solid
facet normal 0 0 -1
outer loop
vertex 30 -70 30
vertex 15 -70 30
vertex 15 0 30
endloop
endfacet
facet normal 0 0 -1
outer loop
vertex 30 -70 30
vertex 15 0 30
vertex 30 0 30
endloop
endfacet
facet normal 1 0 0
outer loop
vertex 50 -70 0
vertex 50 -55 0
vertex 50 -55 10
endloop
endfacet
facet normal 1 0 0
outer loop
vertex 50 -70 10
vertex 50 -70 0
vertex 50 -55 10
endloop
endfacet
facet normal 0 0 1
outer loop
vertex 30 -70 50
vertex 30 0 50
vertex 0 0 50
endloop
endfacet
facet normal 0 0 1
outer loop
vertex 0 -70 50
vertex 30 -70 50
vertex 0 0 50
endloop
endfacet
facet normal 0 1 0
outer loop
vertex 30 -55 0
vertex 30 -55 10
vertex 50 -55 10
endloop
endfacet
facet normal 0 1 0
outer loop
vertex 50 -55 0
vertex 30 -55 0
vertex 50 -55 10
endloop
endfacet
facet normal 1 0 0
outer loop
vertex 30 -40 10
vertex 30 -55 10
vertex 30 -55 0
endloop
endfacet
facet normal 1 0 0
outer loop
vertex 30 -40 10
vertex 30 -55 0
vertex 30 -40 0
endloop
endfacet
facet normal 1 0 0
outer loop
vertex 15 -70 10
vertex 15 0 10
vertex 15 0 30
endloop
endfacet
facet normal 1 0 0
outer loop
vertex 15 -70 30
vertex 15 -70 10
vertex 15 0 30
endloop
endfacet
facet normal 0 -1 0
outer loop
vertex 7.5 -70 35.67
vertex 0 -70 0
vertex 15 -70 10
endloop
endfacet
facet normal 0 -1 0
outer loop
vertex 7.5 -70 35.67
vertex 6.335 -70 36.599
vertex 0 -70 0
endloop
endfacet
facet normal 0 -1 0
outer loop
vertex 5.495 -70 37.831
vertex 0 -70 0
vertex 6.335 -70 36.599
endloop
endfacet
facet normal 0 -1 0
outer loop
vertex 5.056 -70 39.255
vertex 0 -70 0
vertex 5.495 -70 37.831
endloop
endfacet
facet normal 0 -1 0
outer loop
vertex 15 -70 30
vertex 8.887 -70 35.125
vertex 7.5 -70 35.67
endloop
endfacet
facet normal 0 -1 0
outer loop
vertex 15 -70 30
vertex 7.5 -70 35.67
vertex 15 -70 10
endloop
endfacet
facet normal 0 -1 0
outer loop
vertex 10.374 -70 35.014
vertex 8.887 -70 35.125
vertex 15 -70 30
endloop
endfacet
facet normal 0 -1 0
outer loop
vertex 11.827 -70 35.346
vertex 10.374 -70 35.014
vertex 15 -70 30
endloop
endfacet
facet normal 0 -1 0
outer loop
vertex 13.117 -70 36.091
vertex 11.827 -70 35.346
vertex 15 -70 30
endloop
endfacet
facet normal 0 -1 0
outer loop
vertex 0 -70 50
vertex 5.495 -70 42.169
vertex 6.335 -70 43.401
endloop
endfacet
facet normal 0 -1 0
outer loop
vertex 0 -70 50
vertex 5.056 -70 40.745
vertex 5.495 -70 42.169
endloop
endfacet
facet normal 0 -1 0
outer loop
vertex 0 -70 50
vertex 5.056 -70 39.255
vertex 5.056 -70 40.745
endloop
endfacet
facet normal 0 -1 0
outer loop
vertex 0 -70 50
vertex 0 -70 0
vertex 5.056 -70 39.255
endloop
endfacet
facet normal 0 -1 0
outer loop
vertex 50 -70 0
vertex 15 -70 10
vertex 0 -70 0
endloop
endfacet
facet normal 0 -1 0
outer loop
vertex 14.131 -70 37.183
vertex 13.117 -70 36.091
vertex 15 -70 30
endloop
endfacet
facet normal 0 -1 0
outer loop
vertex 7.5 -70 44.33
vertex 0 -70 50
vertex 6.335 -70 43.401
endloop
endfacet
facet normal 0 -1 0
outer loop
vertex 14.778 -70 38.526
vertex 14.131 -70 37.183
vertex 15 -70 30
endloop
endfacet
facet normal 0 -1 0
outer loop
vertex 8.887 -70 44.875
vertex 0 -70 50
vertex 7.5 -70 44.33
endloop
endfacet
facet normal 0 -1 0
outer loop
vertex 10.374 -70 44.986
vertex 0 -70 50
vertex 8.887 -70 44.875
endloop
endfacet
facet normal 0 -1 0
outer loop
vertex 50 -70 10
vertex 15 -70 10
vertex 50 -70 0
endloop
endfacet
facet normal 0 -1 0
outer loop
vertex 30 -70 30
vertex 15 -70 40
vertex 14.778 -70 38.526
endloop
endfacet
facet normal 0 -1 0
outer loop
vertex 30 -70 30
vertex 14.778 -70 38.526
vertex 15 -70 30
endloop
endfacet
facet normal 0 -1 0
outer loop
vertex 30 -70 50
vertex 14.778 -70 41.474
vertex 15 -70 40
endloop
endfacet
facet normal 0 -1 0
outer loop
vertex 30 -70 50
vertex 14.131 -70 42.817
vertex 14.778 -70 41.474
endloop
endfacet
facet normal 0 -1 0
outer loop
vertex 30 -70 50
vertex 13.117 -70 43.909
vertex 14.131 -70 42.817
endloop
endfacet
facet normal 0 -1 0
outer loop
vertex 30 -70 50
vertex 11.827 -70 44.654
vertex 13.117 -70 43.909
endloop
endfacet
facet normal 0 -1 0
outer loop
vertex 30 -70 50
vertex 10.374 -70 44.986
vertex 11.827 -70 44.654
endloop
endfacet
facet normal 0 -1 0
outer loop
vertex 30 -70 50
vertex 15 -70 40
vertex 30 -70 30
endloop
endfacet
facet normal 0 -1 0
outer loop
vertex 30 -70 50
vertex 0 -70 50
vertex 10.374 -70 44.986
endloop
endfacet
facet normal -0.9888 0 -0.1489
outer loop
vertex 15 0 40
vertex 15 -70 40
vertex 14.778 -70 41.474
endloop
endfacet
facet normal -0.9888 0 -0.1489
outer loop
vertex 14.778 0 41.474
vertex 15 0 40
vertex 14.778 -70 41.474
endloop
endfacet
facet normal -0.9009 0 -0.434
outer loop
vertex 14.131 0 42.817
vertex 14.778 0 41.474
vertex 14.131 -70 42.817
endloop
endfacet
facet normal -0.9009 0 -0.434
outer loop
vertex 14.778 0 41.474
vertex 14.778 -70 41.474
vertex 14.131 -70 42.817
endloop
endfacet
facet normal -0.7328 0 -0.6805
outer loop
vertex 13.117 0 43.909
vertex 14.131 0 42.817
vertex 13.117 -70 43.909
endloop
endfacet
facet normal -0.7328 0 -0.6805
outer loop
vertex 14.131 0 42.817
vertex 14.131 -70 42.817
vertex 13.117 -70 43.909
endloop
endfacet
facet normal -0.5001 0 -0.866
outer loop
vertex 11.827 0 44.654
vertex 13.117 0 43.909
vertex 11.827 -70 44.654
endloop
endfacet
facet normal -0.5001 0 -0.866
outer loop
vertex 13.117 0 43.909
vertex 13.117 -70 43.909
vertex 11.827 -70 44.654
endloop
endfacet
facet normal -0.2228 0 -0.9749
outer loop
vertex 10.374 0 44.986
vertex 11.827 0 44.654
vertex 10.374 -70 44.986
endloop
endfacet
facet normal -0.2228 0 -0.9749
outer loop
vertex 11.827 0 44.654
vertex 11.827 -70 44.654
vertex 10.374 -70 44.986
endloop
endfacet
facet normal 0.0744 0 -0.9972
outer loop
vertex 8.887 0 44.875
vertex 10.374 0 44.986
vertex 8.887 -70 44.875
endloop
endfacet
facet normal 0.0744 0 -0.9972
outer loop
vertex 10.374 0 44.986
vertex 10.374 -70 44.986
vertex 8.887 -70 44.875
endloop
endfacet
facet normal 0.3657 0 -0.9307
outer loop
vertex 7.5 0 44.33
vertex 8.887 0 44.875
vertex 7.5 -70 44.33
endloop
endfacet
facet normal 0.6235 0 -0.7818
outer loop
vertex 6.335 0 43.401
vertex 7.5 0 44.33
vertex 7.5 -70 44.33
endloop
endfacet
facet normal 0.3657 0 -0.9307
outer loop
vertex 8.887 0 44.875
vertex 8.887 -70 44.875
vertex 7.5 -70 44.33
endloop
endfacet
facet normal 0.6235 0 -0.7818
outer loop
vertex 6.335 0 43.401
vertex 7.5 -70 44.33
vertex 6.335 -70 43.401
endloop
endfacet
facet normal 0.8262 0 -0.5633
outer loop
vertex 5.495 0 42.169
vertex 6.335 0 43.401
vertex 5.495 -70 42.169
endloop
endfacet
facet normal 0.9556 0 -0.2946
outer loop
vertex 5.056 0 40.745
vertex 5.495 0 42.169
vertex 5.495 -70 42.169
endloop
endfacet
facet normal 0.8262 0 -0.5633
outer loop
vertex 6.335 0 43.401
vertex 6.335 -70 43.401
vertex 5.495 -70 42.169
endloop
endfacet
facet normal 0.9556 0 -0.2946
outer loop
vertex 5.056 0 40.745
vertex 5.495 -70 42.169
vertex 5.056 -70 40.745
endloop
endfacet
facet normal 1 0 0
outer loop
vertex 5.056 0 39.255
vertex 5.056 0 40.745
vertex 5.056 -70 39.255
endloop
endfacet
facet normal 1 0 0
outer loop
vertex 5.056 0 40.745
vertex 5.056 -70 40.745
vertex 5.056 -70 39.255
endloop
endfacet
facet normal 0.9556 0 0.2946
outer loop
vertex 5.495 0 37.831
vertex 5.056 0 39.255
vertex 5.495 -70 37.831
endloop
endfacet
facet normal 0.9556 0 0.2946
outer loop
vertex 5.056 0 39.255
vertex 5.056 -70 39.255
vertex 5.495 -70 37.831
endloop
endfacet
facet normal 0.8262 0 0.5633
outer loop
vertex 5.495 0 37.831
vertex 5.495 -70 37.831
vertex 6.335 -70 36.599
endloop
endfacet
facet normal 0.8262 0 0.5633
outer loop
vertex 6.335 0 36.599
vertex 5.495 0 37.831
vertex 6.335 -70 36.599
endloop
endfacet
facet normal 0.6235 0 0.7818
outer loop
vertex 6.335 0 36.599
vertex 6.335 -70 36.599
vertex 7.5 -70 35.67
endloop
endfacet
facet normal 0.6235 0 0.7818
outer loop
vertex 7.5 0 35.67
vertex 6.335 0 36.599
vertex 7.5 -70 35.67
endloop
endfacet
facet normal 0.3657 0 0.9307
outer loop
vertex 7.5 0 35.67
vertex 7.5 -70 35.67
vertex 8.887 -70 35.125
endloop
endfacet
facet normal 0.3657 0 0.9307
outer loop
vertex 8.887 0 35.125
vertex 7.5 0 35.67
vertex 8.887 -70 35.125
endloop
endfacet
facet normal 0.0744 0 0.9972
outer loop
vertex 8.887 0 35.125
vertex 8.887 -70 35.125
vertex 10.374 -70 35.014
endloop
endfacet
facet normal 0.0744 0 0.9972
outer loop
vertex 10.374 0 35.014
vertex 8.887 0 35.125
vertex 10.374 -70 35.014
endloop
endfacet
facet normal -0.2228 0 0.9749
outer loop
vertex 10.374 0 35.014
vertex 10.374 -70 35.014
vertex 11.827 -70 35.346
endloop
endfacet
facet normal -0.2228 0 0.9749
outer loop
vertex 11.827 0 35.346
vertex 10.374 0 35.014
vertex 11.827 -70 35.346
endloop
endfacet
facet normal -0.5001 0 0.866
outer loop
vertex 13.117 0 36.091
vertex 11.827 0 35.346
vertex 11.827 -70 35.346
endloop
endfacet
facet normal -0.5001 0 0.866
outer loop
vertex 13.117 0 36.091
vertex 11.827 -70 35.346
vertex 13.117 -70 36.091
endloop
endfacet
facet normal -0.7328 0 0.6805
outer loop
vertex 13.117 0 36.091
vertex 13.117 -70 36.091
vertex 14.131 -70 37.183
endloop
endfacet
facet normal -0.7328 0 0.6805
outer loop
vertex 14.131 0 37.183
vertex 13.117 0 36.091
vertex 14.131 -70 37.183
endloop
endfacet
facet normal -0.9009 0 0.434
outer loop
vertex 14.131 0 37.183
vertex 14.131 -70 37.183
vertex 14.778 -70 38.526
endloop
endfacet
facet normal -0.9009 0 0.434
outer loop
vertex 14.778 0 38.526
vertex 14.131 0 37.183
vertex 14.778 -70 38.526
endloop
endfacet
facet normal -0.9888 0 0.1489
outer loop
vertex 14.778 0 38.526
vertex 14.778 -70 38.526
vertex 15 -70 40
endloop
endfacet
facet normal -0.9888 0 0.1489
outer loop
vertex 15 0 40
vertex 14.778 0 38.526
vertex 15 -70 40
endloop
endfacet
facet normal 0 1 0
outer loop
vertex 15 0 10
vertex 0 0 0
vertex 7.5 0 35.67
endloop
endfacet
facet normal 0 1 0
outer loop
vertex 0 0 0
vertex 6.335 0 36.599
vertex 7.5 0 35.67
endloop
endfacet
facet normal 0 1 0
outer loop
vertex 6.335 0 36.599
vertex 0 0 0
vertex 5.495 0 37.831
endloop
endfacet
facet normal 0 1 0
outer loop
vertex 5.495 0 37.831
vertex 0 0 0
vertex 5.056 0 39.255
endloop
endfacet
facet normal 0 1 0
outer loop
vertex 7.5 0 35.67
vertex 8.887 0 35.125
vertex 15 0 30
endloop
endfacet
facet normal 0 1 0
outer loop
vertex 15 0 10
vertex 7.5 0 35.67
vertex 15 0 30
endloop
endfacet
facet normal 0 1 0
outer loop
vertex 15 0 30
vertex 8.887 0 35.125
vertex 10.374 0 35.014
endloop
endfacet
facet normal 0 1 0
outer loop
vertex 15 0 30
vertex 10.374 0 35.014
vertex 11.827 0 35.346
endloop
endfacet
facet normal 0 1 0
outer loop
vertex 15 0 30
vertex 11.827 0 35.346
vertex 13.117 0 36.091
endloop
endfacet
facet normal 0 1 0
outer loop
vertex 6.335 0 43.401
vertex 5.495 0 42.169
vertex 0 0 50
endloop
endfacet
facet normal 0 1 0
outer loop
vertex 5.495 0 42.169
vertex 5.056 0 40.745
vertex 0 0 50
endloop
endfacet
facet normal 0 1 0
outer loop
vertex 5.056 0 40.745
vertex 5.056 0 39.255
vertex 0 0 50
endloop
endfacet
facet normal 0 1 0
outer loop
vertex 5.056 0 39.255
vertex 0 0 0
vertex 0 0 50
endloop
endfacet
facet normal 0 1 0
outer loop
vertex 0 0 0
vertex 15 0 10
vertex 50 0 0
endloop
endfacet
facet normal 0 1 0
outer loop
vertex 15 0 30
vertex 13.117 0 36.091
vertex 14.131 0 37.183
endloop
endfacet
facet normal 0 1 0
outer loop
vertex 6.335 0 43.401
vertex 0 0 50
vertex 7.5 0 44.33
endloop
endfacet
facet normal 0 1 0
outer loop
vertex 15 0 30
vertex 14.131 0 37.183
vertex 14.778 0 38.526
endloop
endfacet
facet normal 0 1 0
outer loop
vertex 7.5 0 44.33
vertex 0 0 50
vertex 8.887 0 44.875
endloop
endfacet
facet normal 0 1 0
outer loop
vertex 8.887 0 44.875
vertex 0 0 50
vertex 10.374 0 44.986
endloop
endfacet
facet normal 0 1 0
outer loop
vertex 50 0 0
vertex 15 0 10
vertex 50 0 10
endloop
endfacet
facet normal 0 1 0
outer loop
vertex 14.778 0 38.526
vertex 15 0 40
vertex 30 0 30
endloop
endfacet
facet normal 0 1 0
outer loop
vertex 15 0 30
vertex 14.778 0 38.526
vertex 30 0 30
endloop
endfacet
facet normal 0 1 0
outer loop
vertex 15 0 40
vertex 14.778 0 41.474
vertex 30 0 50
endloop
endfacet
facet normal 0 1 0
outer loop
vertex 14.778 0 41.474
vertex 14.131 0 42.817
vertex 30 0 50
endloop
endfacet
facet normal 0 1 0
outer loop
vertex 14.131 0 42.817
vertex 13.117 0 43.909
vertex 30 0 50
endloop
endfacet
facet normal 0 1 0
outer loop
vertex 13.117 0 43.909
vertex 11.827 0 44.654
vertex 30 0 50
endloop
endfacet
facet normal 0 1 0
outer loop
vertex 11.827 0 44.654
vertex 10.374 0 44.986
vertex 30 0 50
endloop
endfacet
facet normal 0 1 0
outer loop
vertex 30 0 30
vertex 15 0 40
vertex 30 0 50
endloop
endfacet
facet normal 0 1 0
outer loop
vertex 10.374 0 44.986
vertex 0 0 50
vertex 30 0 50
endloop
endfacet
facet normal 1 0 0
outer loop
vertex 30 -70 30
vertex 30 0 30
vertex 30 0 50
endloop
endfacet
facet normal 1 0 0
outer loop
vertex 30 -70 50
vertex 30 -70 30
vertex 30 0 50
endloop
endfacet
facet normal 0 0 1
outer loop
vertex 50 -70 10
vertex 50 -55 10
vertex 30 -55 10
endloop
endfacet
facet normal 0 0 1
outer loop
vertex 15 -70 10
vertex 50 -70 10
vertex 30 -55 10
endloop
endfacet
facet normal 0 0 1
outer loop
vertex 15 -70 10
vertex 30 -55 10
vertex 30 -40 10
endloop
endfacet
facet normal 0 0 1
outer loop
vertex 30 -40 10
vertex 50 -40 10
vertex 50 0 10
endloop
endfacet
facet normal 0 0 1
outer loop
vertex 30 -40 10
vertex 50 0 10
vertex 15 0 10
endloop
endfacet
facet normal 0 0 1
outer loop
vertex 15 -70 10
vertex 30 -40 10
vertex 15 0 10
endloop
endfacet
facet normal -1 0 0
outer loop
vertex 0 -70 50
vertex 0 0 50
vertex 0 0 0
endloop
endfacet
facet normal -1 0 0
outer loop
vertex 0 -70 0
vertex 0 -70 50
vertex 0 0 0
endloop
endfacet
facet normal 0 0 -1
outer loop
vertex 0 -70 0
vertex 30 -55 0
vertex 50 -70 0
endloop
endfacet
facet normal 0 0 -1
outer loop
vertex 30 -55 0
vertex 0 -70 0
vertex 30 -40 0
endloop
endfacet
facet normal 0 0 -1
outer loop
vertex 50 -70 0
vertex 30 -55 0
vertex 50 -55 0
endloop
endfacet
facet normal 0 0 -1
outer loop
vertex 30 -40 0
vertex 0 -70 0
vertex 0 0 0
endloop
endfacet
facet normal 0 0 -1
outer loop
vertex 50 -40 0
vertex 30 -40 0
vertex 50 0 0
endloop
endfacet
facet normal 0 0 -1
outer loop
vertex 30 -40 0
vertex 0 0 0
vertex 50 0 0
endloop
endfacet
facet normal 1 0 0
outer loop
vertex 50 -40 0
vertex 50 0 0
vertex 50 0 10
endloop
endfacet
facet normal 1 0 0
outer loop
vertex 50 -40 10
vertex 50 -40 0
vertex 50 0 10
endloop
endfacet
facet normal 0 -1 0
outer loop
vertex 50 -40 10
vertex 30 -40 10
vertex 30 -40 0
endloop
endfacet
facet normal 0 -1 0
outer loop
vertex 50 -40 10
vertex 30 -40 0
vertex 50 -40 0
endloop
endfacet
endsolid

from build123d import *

# Parameters (mm, degrees)
F1_DEPTH = 70
F2_W     = 20
F2_H     = 15
F3_DEPTH = 25
F4_R     = 5
F5_DEPTH = 70.001


with BuildPart() as f1:
    # F0 (on Front) → F1 (new body)
    with BuildSketch(Plane.XZ):
        Polygon((0, 50), (0, 0), (50, 0), (50, 10), (15, 10), (15, 30), (30, 30), (30, 50), align=None)
    extrude(amount=F1_DEPTH)

    # F2 (on face) → F3 (cut)
    with BuildSketch(Plane.XY.offset(10)):
        with Locations((40, -47.5)):
            Rectangle(F2_W, F2_H)
    extrude(amount=-F3_DEPTH, mode=Mode.SUBTRACT)

    # F4 (on face) → F5 (cut, through all)
    with BuildSketch(Plane.XZ.offset(70)):
        with Locations((10, 40)):
            Circle(F4_R)
    extrude(amount=-F5_DEPTH, mode=Mode.SUBTRACT)


solid = f1.part
